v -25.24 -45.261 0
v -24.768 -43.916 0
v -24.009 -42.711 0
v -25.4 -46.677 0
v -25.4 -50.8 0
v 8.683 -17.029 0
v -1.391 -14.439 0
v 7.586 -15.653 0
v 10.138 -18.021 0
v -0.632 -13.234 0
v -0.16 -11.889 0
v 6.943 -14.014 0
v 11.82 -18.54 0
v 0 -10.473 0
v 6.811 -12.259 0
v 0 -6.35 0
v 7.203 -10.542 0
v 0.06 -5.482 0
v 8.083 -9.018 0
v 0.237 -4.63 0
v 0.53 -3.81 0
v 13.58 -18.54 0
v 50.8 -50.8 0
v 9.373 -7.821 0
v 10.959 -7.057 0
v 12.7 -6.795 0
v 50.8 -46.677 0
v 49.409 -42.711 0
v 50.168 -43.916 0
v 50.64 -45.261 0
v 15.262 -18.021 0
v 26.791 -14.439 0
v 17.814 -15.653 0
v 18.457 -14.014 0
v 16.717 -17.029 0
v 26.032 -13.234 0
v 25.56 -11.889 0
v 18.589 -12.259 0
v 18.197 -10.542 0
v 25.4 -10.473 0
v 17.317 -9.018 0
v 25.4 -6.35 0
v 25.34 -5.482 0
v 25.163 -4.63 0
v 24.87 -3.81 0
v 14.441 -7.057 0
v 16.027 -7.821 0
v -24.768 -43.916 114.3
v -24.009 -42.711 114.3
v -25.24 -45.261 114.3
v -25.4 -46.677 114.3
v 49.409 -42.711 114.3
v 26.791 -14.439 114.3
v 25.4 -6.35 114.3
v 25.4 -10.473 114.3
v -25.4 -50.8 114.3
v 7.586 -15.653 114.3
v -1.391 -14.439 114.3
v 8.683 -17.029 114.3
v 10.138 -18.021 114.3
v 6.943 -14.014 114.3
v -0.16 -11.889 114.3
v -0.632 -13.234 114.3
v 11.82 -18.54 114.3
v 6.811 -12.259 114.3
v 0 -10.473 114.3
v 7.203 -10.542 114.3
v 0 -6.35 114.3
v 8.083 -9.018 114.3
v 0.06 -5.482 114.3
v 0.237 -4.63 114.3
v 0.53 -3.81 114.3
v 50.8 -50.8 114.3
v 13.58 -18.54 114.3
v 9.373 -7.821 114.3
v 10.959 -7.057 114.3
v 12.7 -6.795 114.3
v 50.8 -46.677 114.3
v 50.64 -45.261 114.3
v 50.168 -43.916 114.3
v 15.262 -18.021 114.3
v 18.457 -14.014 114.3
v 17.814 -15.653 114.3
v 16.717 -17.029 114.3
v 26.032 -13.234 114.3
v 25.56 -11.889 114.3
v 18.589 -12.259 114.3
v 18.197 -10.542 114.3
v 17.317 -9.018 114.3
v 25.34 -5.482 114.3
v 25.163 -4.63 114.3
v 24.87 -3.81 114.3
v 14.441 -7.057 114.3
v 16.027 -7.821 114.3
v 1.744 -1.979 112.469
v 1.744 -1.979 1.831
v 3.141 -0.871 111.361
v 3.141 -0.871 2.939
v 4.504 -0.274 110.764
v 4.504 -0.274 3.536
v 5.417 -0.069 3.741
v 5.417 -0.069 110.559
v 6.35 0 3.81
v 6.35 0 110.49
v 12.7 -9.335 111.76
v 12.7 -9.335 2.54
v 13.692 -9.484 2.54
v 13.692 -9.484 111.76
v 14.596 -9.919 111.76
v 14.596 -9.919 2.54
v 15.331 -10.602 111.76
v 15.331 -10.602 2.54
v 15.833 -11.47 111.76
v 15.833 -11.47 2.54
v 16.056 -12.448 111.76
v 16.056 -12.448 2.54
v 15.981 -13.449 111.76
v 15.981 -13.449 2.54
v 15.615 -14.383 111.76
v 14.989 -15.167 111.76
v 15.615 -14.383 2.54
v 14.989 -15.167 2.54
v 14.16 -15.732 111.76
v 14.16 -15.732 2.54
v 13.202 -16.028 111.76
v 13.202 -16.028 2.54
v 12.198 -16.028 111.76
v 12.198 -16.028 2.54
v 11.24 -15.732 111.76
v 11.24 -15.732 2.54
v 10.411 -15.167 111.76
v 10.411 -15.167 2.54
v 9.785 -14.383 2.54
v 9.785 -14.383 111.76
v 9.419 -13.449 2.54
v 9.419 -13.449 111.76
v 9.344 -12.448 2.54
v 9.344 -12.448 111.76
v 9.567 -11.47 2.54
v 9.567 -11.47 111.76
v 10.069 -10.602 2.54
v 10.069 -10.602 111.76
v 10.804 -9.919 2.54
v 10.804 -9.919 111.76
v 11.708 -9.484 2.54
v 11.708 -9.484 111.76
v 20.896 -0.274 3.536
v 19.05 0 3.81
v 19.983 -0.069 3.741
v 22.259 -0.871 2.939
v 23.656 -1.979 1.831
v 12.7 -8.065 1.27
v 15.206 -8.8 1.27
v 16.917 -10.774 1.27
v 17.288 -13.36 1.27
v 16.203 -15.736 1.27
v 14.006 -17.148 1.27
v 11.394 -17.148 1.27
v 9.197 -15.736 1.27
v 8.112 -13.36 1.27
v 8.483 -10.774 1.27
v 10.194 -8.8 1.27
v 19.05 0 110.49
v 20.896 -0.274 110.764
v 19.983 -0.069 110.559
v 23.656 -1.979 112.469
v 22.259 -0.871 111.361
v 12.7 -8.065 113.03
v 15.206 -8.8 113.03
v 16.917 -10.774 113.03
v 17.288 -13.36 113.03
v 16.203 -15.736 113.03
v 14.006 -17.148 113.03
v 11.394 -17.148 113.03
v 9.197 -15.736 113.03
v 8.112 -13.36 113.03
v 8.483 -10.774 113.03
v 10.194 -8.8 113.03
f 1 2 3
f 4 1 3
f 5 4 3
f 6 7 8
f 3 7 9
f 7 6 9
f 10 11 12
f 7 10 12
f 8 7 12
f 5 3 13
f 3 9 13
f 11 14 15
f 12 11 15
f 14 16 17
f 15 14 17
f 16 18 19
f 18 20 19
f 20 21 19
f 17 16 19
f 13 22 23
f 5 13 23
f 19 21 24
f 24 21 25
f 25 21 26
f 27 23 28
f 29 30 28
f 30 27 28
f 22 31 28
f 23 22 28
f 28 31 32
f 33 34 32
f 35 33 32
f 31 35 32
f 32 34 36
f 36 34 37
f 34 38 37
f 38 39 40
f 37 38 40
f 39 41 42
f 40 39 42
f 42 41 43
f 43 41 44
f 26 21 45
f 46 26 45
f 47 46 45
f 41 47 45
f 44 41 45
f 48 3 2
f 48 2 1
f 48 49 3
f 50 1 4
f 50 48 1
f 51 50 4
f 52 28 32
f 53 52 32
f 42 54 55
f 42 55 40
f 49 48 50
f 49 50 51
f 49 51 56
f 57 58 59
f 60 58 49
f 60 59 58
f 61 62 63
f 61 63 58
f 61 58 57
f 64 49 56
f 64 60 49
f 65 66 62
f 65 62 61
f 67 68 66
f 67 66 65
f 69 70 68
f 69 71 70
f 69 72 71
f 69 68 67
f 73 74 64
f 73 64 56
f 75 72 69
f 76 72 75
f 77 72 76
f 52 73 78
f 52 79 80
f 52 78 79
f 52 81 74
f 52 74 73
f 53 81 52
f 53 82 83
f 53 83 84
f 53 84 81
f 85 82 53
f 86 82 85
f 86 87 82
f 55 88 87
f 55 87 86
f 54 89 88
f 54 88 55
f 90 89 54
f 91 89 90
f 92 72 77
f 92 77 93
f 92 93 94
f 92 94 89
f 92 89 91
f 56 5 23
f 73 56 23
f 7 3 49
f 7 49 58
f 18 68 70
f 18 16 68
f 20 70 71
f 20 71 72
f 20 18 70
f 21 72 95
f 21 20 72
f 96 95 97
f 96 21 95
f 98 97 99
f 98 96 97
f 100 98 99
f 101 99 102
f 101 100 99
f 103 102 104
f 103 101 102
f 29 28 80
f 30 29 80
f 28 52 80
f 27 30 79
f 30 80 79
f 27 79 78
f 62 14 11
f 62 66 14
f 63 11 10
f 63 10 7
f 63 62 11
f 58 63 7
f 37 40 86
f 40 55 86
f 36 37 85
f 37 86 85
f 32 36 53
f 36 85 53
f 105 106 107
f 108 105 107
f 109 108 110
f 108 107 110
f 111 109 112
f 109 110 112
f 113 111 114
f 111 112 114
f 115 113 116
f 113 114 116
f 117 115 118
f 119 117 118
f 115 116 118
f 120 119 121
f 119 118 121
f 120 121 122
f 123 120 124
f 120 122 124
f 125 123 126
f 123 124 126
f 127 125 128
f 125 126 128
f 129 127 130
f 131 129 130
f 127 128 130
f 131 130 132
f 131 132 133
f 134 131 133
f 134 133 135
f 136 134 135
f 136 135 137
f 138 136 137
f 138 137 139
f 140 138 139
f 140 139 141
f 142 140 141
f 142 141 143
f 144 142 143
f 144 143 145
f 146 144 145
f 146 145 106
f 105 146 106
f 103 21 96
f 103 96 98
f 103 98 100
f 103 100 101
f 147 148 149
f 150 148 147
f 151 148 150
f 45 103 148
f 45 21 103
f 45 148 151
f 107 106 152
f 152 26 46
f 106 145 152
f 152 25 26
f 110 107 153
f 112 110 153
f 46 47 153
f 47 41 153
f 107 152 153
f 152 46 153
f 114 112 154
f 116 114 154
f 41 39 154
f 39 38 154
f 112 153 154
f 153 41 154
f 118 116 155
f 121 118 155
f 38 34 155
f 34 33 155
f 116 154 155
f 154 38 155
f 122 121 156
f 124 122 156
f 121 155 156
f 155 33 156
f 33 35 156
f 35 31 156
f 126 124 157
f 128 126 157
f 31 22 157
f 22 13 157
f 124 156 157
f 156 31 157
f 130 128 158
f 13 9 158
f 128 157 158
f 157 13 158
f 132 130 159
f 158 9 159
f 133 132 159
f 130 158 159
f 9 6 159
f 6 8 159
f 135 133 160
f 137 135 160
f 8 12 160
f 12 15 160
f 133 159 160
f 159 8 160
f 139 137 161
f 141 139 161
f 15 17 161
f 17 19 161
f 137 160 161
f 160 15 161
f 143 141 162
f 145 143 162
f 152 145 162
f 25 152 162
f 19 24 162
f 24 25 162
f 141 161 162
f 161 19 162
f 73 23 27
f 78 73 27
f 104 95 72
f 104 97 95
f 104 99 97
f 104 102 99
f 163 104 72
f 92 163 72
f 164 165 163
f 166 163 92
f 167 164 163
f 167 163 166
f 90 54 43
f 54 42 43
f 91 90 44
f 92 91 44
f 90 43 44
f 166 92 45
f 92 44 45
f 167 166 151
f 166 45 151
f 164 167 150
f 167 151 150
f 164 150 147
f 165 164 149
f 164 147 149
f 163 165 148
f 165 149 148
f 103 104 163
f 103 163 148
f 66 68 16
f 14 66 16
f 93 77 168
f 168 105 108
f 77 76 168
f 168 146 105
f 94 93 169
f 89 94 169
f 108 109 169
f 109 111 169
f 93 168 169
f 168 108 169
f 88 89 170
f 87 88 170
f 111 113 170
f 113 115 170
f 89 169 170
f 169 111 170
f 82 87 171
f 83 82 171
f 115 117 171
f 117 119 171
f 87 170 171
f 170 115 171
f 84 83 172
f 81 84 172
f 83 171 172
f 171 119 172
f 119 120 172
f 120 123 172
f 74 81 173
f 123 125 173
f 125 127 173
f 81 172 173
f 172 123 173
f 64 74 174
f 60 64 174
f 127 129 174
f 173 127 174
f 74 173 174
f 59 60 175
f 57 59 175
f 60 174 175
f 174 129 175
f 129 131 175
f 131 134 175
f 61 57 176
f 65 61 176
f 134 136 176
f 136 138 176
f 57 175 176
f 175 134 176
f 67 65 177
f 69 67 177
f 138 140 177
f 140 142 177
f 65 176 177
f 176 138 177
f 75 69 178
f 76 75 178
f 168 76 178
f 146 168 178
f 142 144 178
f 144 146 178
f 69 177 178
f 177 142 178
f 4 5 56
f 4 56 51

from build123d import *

# Parameters (mm, degrees)
SKETCH1_W           = 114.3
SKETCH1_H           = 50.8
BOSS_EXTRUDE1_DEPTH = 25.4
SKETCH2_R           = 3.3655
CUT_EXTRUDE1_DEPTH  = 128.633420388
CHAMFER1_SIZE       = 2.54
BOSS_EXTRUDE2_DEPTH = 114.3
CHAMFER2_SIZE       = 3.81
FILLET1_R           = 6.35


with BuildPart() as part:
    # Sketch1 → Boss-Extrude1 (new body)
    with BuildSketch(Plane(origin=(0, 0, 0), x_dir=(0, 0, -1), z_dir=(1, 0, 0))):
        with Locations((-57.15, -25.4)):
            Rectangle(SKETCH1_W, SKETCH1_H)
    extrude(amount=BOSS_EXTRUDE1_DEPTH)

    # Sketch2 → Cut-Extrude1 (cut, through all)
    with BuildSketch(Plane(origin=(0, 0, 0), x_dir=(-1, 0, 0), z_dir=(0, 0, -1))):
        with Locations(Location((-12.7, -12.7, 0), (0, 0, 90))):
            Circle(SKETCH2_R)
    extrude(amount=-CUT_EXTRUDE1_DEPTH, mode=Mode.SUBTRACT)

    # Chamfer1
    chamfer1_edges = [part.edges().sort_by_distance(p)[0] for p in [
        (12.7, -16.0655, 114.3),
        (12.7, -16.0655, 0),
    ]]
    chamfer(chamfer1_edges, length=CHAMFER1_SIZE)

    # Sketch3 → Boss-Extrude2 (add)
    with BuildSketch(Plane(origin=(0, 0, 0), x_dir=(-1, 0, 0), z_dir=(0, 0, -1))):
        Polygon((-50.8, -44.45), (-25.4, -12.7), (-25.4, -50.8), (-50.8, -50.8), align=None)
        Polygon((25.4, -50.8), (25.4, -44.45), (0, -12.7), (0, -50.8), align=None)
    extrude(amount=-BOSS_EXTRUDE2_DEPTH)

    # Chamfer2
    chamfer2_edges = [part.edges().sort_by_distance(p)[0] for p in [
        (12.7, 0, 114.3),
        (12.7, 0, 0),
    ]]
    chamfer(chamfer2_edges, length=CHAMFER2_SIZE)

    # Fillet1
    fillet1_edges = [part.edges().sort_by_distance(p)[0] for p in [
        (-25.4, -44.45, 57.15),
        (0, -12.7, 57.15),
        (0, 0, 57.15),
        (25.4, 0, 57.15),
        (50.8, -44.45, 57.15),
        (25.4, -12.7, 57.15),
    ]]
    fillet(fillet1_edges, radius=FILLET1_R)


solid = part.part
